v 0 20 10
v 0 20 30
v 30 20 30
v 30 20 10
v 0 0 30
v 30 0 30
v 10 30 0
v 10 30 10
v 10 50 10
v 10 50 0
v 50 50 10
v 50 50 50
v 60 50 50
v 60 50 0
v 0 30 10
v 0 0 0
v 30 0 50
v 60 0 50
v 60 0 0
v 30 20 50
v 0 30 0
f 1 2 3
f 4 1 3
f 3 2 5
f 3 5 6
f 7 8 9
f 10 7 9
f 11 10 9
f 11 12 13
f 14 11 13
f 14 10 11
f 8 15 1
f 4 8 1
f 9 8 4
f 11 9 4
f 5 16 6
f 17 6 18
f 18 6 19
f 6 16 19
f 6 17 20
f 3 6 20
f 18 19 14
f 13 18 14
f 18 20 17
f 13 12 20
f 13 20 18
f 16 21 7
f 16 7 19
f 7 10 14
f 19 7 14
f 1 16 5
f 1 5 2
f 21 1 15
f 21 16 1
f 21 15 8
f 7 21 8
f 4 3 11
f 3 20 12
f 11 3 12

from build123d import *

# Parameters (mm, degrees)
SKETCH1_W           = 60
SKETCH1_H           = 50
BOSS_EXTRUDE2_DEPTH = 50
SKETCH2_W           = 10
SKETCH2_H           = 20
CUT_EXTRUDE1_DEPTH  = 50
SKETCH3_W           = 30
SKETCH3_H           = 20
CUT_EXTRUDE2_DEPTH  = 20
CUT_EXTRUDE4_DEPTH  = 40


with BuildPart() as part:
    # Sketch1 → Boss-Extrude2 (new body)
    with BuildSketch(Plane.XY):
        with Locations((30, 25)):
            Rectangle(SKETCH1_W, SKETCH1_H)
    extrude(amount=BOSS_EXTRUDE2_DEPTH)

    # Sketch2 → Cut-Extrude1 (cut)
    with BuildSketch(Plane.XY.offset(50)):
        with Locations((5, 40)):
            Rectangle(SKETCH2_W, SKETCH2_H)
    extrude(amount=-CUT_EXTRUDE1_DEPTH, mode=Mode.SUBTRACT)

    # Sketch3 → Cut-Extrude2 (cut)
    with BuildSketch(Plane.XY.offset(50)):
        with Locations((15, 10)):
            Rectangle(SKETCH3_W, SKETCH3_H)
    extrude(amount=-CUT_EXTRUDE2_DEPTH, mode=Mode.SUBTRACT)

    # Sketch4 → Cut-Extrude4 (cut)
    with BuildSketch(Plane.XY.offset(50)):
        Polygon((30, 20), (50, 50), (10, 50), (10, 30), (0, 30), (0, 20), align=None)
    extrude(amount=-CUT_EXTRUDE4_DEPTH, mode=Mode.SUBTRACT)


solid = part.part
